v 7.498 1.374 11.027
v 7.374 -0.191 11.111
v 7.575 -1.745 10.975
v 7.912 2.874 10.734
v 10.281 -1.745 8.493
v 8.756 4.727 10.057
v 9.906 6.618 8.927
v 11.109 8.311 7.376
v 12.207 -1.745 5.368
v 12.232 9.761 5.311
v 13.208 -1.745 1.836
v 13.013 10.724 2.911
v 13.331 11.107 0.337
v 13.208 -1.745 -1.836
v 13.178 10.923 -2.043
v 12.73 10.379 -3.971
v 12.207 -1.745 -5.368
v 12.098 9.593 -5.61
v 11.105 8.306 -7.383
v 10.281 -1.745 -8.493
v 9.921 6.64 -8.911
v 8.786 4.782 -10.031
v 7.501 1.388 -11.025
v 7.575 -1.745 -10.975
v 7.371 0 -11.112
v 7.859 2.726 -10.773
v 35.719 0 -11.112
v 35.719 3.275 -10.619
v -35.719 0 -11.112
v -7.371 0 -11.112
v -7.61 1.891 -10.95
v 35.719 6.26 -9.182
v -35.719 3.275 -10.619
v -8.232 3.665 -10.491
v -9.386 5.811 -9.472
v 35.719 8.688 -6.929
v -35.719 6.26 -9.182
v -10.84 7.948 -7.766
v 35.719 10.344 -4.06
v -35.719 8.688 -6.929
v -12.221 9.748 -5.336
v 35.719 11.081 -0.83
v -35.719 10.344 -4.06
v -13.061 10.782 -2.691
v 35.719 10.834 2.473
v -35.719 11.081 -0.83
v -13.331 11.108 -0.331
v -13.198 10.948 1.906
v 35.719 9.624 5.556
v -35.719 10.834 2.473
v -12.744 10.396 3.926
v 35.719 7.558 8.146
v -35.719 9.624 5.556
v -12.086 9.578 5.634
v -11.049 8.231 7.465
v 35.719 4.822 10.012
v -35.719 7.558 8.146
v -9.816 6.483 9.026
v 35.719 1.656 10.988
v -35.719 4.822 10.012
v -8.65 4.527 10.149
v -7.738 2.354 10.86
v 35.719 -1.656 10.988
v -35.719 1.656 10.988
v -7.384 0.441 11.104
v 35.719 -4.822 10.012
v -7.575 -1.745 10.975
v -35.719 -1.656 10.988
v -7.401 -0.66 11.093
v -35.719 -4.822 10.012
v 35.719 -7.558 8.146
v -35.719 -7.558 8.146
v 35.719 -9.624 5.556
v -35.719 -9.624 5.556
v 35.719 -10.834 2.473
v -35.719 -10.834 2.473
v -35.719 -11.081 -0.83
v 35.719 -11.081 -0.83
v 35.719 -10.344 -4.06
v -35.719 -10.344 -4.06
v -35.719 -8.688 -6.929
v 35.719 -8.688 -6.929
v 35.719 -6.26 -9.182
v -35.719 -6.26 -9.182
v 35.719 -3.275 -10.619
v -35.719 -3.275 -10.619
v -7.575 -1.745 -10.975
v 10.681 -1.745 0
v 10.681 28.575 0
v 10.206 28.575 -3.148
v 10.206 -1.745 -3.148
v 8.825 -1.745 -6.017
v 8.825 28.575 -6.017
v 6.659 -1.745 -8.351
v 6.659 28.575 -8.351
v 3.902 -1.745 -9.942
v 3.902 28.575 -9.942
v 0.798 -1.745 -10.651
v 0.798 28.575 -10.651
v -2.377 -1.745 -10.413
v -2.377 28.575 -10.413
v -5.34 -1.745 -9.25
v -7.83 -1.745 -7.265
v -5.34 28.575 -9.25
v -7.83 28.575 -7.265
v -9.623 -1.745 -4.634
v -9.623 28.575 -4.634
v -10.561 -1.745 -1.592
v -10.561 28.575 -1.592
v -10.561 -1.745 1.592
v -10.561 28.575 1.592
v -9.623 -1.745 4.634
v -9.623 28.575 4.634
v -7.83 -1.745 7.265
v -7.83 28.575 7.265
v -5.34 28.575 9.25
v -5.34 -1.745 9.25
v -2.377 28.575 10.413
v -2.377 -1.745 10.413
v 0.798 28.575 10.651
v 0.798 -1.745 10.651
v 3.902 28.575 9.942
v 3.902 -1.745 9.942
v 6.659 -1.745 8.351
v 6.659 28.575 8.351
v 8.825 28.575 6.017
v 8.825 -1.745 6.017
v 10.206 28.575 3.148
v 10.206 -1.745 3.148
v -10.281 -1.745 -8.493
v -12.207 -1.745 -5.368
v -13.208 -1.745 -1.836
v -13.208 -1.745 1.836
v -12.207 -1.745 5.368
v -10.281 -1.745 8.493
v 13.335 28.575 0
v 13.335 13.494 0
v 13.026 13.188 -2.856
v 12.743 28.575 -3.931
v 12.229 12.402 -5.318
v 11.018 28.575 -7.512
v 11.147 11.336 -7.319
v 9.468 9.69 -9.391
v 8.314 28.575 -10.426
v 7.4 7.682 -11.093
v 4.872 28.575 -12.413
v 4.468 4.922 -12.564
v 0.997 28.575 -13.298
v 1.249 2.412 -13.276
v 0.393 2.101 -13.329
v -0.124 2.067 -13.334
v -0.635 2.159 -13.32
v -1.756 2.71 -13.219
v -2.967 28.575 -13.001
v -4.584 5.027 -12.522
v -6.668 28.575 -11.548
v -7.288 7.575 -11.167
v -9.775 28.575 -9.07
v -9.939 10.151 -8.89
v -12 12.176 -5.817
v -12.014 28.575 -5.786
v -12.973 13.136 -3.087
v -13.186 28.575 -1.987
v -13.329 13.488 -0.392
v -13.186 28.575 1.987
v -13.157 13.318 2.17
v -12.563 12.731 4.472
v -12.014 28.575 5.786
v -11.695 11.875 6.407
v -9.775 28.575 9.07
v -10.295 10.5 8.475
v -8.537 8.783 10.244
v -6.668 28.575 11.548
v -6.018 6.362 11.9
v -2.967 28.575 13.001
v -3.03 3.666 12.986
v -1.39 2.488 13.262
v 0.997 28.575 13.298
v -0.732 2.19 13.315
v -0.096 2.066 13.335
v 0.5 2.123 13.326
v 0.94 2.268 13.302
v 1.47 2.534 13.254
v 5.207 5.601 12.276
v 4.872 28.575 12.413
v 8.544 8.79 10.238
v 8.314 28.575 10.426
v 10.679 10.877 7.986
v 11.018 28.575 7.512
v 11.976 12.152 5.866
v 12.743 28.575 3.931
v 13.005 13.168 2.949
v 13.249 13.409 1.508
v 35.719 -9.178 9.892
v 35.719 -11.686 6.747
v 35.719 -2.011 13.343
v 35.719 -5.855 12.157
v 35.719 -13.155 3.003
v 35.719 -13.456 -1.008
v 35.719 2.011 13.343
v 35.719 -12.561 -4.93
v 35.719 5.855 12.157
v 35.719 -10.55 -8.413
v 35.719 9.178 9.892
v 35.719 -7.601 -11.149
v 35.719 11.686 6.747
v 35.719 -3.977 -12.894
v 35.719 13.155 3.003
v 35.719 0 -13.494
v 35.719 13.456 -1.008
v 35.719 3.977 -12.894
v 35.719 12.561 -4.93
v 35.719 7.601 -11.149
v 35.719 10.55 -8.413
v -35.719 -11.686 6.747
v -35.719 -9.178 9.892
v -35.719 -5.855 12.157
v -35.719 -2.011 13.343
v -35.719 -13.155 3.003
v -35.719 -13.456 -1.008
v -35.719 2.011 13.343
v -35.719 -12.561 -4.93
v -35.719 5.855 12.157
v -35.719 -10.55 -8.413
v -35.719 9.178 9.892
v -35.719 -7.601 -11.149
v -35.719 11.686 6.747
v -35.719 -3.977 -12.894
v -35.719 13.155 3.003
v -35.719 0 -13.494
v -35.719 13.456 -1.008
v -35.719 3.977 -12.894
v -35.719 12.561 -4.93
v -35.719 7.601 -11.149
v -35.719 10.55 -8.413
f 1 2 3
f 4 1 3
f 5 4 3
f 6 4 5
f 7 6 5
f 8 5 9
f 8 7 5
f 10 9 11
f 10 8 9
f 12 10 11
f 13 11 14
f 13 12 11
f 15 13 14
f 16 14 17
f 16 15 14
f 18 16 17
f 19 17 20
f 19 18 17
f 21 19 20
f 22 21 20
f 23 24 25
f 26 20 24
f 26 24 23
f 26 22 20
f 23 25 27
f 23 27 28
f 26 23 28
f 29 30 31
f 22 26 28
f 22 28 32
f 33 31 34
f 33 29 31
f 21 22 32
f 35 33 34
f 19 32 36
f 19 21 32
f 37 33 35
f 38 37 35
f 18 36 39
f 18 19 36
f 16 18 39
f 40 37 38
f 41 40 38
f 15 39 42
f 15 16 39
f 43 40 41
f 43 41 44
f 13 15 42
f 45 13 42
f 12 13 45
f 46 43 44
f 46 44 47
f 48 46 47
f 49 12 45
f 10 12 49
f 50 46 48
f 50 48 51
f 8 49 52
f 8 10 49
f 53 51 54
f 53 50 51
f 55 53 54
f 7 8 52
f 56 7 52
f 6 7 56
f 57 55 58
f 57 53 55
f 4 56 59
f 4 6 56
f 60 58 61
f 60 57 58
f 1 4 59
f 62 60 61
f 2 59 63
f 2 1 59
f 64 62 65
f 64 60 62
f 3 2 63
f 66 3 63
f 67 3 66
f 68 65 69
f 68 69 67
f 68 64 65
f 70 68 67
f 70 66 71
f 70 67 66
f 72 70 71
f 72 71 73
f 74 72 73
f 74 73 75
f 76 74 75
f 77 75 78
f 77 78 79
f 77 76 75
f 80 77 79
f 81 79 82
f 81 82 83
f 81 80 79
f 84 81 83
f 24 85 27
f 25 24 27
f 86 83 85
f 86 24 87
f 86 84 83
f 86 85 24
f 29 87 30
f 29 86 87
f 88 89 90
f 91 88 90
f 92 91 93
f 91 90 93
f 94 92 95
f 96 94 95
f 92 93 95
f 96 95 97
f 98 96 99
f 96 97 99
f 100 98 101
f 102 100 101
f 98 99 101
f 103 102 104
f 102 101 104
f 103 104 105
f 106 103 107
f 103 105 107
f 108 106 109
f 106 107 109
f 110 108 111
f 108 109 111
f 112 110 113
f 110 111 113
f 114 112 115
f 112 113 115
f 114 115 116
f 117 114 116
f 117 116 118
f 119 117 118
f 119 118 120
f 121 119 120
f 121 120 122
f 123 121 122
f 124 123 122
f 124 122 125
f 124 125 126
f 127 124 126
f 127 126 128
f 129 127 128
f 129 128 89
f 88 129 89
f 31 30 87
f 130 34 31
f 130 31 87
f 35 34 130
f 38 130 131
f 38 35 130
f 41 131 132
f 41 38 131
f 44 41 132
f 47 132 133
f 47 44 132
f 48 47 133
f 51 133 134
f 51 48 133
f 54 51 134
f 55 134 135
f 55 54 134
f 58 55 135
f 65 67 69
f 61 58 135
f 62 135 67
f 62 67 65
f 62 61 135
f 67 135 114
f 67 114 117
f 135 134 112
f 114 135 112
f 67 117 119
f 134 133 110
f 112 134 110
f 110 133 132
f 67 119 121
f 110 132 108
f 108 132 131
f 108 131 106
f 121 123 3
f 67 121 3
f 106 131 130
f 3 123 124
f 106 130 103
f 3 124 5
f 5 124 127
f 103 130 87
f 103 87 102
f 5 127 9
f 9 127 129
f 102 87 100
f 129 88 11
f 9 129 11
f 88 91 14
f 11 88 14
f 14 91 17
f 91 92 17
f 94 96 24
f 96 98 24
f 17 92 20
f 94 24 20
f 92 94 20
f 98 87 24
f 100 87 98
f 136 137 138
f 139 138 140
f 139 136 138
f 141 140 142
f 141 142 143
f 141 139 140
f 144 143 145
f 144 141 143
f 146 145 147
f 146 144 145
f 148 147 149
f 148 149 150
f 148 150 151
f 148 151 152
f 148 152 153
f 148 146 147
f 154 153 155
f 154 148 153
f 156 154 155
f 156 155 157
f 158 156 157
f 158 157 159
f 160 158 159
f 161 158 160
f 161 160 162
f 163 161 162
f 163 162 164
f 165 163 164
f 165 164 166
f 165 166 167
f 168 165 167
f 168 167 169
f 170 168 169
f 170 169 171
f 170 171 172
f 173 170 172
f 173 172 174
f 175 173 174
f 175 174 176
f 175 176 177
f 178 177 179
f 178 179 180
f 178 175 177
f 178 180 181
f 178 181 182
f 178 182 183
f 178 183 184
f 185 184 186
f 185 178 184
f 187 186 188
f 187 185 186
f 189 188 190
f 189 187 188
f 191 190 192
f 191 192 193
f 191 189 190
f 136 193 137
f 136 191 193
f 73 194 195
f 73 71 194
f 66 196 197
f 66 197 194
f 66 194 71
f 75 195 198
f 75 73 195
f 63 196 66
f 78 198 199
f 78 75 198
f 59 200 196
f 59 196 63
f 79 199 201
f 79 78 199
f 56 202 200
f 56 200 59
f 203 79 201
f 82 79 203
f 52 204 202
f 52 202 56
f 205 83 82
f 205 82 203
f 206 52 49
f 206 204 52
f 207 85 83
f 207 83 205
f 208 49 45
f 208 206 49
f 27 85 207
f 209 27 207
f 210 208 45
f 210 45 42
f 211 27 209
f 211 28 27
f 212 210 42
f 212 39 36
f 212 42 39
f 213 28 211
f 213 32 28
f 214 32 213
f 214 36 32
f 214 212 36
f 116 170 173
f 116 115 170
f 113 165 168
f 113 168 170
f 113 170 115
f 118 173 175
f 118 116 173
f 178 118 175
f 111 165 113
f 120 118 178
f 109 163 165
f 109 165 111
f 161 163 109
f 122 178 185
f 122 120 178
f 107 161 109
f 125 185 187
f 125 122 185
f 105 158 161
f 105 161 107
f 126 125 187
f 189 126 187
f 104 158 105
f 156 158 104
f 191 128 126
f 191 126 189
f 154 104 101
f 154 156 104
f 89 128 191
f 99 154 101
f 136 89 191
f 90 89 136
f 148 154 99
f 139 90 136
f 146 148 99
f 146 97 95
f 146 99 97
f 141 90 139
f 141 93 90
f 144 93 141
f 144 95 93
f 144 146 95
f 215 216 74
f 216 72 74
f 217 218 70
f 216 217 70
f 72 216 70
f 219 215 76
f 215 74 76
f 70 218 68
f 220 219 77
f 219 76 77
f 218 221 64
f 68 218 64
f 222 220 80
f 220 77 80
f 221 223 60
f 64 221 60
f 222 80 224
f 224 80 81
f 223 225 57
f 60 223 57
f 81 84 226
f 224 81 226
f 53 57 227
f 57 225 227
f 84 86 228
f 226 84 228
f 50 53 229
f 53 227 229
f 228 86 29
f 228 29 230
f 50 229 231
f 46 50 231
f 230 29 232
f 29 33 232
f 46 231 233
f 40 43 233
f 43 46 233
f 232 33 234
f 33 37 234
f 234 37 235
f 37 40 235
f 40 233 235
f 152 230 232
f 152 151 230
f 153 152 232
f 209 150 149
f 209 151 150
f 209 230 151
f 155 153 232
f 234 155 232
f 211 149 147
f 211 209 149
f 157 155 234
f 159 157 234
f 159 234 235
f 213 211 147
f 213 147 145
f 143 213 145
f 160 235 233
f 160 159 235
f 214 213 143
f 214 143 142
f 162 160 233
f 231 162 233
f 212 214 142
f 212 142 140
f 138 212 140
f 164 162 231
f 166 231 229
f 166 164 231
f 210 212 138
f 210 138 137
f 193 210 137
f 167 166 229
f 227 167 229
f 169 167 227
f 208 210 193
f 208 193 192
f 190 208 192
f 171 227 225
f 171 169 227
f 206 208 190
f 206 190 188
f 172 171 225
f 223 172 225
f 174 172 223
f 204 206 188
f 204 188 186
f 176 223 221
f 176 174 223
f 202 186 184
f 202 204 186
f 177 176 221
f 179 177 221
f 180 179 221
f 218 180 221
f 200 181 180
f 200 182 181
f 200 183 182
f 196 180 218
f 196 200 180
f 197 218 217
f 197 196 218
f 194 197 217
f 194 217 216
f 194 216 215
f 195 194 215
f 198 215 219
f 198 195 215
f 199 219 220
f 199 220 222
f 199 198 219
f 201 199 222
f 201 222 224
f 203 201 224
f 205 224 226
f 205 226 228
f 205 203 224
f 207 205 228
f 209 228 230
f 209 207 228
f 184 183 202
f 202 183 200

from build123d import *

# Parameters (mm, degrees)
SKETCH2_R           = 13.49375
SKETCH2_R_2         = 11.1125
BOSS_EXTRUDE1_DEPTH = 35.71875
SKETCH5_R           = 13.335
BOSS_EXTRUDE2_DEPTH = 30.32
CUT_EXTRUDE1_REACH  = 44.069
SKETCH6_R           = 10.6807


with BuildPart() as part:
    # Sketch2 → Boss-Extrude1 (new body, symmetric)
    with BuildSketch(Plane(origin=(0, 0, 0), x_dir=(0, 0, -1), z_dir=(1, 0, 0))):
        Circle(SKETCH2_R)
        Circle(SKETCH2_R_2, mode=Mode.SUBTRACT)
    extrude(amount=BOSS_EXTRUDE1_DEPTH, both=True)

    # Sketch5 → Boss-Extrude2 (add)
    with BuildSketch(Plane(origin=(0, 28.575, 0), x_dir=(1, 0, 0), z_dir=(0, 1, 0))):
        Circle(SKETCH5_R)
    extrude(amount=-BOSS_EXTRUDE2_DEPTH)

    # Sketch6 → Cut-Extrude1 (cut, up to next)
    with BuildSketch(Plane(origin=(0, 28.575, 0), x_dir=(1, 0, 0), z_dir=(0, 1, 0)), mode=Mode.PRIVATE) as cut_extrude1_sk1:
        Circle(SKETCH6_R)
    cut_extrude1_tool1 = extrude(cut_extrude1_sk1.sketch, amount=-CUT_EXTRUDE1_REACH, mode=Mode.PRIVATE) & part.part
    add(cut_extrude1_tool1.solids().sort_by_distance((0, 28.575, 0))[0], mode=Mode.SUBTRACT)


solid = part.part
